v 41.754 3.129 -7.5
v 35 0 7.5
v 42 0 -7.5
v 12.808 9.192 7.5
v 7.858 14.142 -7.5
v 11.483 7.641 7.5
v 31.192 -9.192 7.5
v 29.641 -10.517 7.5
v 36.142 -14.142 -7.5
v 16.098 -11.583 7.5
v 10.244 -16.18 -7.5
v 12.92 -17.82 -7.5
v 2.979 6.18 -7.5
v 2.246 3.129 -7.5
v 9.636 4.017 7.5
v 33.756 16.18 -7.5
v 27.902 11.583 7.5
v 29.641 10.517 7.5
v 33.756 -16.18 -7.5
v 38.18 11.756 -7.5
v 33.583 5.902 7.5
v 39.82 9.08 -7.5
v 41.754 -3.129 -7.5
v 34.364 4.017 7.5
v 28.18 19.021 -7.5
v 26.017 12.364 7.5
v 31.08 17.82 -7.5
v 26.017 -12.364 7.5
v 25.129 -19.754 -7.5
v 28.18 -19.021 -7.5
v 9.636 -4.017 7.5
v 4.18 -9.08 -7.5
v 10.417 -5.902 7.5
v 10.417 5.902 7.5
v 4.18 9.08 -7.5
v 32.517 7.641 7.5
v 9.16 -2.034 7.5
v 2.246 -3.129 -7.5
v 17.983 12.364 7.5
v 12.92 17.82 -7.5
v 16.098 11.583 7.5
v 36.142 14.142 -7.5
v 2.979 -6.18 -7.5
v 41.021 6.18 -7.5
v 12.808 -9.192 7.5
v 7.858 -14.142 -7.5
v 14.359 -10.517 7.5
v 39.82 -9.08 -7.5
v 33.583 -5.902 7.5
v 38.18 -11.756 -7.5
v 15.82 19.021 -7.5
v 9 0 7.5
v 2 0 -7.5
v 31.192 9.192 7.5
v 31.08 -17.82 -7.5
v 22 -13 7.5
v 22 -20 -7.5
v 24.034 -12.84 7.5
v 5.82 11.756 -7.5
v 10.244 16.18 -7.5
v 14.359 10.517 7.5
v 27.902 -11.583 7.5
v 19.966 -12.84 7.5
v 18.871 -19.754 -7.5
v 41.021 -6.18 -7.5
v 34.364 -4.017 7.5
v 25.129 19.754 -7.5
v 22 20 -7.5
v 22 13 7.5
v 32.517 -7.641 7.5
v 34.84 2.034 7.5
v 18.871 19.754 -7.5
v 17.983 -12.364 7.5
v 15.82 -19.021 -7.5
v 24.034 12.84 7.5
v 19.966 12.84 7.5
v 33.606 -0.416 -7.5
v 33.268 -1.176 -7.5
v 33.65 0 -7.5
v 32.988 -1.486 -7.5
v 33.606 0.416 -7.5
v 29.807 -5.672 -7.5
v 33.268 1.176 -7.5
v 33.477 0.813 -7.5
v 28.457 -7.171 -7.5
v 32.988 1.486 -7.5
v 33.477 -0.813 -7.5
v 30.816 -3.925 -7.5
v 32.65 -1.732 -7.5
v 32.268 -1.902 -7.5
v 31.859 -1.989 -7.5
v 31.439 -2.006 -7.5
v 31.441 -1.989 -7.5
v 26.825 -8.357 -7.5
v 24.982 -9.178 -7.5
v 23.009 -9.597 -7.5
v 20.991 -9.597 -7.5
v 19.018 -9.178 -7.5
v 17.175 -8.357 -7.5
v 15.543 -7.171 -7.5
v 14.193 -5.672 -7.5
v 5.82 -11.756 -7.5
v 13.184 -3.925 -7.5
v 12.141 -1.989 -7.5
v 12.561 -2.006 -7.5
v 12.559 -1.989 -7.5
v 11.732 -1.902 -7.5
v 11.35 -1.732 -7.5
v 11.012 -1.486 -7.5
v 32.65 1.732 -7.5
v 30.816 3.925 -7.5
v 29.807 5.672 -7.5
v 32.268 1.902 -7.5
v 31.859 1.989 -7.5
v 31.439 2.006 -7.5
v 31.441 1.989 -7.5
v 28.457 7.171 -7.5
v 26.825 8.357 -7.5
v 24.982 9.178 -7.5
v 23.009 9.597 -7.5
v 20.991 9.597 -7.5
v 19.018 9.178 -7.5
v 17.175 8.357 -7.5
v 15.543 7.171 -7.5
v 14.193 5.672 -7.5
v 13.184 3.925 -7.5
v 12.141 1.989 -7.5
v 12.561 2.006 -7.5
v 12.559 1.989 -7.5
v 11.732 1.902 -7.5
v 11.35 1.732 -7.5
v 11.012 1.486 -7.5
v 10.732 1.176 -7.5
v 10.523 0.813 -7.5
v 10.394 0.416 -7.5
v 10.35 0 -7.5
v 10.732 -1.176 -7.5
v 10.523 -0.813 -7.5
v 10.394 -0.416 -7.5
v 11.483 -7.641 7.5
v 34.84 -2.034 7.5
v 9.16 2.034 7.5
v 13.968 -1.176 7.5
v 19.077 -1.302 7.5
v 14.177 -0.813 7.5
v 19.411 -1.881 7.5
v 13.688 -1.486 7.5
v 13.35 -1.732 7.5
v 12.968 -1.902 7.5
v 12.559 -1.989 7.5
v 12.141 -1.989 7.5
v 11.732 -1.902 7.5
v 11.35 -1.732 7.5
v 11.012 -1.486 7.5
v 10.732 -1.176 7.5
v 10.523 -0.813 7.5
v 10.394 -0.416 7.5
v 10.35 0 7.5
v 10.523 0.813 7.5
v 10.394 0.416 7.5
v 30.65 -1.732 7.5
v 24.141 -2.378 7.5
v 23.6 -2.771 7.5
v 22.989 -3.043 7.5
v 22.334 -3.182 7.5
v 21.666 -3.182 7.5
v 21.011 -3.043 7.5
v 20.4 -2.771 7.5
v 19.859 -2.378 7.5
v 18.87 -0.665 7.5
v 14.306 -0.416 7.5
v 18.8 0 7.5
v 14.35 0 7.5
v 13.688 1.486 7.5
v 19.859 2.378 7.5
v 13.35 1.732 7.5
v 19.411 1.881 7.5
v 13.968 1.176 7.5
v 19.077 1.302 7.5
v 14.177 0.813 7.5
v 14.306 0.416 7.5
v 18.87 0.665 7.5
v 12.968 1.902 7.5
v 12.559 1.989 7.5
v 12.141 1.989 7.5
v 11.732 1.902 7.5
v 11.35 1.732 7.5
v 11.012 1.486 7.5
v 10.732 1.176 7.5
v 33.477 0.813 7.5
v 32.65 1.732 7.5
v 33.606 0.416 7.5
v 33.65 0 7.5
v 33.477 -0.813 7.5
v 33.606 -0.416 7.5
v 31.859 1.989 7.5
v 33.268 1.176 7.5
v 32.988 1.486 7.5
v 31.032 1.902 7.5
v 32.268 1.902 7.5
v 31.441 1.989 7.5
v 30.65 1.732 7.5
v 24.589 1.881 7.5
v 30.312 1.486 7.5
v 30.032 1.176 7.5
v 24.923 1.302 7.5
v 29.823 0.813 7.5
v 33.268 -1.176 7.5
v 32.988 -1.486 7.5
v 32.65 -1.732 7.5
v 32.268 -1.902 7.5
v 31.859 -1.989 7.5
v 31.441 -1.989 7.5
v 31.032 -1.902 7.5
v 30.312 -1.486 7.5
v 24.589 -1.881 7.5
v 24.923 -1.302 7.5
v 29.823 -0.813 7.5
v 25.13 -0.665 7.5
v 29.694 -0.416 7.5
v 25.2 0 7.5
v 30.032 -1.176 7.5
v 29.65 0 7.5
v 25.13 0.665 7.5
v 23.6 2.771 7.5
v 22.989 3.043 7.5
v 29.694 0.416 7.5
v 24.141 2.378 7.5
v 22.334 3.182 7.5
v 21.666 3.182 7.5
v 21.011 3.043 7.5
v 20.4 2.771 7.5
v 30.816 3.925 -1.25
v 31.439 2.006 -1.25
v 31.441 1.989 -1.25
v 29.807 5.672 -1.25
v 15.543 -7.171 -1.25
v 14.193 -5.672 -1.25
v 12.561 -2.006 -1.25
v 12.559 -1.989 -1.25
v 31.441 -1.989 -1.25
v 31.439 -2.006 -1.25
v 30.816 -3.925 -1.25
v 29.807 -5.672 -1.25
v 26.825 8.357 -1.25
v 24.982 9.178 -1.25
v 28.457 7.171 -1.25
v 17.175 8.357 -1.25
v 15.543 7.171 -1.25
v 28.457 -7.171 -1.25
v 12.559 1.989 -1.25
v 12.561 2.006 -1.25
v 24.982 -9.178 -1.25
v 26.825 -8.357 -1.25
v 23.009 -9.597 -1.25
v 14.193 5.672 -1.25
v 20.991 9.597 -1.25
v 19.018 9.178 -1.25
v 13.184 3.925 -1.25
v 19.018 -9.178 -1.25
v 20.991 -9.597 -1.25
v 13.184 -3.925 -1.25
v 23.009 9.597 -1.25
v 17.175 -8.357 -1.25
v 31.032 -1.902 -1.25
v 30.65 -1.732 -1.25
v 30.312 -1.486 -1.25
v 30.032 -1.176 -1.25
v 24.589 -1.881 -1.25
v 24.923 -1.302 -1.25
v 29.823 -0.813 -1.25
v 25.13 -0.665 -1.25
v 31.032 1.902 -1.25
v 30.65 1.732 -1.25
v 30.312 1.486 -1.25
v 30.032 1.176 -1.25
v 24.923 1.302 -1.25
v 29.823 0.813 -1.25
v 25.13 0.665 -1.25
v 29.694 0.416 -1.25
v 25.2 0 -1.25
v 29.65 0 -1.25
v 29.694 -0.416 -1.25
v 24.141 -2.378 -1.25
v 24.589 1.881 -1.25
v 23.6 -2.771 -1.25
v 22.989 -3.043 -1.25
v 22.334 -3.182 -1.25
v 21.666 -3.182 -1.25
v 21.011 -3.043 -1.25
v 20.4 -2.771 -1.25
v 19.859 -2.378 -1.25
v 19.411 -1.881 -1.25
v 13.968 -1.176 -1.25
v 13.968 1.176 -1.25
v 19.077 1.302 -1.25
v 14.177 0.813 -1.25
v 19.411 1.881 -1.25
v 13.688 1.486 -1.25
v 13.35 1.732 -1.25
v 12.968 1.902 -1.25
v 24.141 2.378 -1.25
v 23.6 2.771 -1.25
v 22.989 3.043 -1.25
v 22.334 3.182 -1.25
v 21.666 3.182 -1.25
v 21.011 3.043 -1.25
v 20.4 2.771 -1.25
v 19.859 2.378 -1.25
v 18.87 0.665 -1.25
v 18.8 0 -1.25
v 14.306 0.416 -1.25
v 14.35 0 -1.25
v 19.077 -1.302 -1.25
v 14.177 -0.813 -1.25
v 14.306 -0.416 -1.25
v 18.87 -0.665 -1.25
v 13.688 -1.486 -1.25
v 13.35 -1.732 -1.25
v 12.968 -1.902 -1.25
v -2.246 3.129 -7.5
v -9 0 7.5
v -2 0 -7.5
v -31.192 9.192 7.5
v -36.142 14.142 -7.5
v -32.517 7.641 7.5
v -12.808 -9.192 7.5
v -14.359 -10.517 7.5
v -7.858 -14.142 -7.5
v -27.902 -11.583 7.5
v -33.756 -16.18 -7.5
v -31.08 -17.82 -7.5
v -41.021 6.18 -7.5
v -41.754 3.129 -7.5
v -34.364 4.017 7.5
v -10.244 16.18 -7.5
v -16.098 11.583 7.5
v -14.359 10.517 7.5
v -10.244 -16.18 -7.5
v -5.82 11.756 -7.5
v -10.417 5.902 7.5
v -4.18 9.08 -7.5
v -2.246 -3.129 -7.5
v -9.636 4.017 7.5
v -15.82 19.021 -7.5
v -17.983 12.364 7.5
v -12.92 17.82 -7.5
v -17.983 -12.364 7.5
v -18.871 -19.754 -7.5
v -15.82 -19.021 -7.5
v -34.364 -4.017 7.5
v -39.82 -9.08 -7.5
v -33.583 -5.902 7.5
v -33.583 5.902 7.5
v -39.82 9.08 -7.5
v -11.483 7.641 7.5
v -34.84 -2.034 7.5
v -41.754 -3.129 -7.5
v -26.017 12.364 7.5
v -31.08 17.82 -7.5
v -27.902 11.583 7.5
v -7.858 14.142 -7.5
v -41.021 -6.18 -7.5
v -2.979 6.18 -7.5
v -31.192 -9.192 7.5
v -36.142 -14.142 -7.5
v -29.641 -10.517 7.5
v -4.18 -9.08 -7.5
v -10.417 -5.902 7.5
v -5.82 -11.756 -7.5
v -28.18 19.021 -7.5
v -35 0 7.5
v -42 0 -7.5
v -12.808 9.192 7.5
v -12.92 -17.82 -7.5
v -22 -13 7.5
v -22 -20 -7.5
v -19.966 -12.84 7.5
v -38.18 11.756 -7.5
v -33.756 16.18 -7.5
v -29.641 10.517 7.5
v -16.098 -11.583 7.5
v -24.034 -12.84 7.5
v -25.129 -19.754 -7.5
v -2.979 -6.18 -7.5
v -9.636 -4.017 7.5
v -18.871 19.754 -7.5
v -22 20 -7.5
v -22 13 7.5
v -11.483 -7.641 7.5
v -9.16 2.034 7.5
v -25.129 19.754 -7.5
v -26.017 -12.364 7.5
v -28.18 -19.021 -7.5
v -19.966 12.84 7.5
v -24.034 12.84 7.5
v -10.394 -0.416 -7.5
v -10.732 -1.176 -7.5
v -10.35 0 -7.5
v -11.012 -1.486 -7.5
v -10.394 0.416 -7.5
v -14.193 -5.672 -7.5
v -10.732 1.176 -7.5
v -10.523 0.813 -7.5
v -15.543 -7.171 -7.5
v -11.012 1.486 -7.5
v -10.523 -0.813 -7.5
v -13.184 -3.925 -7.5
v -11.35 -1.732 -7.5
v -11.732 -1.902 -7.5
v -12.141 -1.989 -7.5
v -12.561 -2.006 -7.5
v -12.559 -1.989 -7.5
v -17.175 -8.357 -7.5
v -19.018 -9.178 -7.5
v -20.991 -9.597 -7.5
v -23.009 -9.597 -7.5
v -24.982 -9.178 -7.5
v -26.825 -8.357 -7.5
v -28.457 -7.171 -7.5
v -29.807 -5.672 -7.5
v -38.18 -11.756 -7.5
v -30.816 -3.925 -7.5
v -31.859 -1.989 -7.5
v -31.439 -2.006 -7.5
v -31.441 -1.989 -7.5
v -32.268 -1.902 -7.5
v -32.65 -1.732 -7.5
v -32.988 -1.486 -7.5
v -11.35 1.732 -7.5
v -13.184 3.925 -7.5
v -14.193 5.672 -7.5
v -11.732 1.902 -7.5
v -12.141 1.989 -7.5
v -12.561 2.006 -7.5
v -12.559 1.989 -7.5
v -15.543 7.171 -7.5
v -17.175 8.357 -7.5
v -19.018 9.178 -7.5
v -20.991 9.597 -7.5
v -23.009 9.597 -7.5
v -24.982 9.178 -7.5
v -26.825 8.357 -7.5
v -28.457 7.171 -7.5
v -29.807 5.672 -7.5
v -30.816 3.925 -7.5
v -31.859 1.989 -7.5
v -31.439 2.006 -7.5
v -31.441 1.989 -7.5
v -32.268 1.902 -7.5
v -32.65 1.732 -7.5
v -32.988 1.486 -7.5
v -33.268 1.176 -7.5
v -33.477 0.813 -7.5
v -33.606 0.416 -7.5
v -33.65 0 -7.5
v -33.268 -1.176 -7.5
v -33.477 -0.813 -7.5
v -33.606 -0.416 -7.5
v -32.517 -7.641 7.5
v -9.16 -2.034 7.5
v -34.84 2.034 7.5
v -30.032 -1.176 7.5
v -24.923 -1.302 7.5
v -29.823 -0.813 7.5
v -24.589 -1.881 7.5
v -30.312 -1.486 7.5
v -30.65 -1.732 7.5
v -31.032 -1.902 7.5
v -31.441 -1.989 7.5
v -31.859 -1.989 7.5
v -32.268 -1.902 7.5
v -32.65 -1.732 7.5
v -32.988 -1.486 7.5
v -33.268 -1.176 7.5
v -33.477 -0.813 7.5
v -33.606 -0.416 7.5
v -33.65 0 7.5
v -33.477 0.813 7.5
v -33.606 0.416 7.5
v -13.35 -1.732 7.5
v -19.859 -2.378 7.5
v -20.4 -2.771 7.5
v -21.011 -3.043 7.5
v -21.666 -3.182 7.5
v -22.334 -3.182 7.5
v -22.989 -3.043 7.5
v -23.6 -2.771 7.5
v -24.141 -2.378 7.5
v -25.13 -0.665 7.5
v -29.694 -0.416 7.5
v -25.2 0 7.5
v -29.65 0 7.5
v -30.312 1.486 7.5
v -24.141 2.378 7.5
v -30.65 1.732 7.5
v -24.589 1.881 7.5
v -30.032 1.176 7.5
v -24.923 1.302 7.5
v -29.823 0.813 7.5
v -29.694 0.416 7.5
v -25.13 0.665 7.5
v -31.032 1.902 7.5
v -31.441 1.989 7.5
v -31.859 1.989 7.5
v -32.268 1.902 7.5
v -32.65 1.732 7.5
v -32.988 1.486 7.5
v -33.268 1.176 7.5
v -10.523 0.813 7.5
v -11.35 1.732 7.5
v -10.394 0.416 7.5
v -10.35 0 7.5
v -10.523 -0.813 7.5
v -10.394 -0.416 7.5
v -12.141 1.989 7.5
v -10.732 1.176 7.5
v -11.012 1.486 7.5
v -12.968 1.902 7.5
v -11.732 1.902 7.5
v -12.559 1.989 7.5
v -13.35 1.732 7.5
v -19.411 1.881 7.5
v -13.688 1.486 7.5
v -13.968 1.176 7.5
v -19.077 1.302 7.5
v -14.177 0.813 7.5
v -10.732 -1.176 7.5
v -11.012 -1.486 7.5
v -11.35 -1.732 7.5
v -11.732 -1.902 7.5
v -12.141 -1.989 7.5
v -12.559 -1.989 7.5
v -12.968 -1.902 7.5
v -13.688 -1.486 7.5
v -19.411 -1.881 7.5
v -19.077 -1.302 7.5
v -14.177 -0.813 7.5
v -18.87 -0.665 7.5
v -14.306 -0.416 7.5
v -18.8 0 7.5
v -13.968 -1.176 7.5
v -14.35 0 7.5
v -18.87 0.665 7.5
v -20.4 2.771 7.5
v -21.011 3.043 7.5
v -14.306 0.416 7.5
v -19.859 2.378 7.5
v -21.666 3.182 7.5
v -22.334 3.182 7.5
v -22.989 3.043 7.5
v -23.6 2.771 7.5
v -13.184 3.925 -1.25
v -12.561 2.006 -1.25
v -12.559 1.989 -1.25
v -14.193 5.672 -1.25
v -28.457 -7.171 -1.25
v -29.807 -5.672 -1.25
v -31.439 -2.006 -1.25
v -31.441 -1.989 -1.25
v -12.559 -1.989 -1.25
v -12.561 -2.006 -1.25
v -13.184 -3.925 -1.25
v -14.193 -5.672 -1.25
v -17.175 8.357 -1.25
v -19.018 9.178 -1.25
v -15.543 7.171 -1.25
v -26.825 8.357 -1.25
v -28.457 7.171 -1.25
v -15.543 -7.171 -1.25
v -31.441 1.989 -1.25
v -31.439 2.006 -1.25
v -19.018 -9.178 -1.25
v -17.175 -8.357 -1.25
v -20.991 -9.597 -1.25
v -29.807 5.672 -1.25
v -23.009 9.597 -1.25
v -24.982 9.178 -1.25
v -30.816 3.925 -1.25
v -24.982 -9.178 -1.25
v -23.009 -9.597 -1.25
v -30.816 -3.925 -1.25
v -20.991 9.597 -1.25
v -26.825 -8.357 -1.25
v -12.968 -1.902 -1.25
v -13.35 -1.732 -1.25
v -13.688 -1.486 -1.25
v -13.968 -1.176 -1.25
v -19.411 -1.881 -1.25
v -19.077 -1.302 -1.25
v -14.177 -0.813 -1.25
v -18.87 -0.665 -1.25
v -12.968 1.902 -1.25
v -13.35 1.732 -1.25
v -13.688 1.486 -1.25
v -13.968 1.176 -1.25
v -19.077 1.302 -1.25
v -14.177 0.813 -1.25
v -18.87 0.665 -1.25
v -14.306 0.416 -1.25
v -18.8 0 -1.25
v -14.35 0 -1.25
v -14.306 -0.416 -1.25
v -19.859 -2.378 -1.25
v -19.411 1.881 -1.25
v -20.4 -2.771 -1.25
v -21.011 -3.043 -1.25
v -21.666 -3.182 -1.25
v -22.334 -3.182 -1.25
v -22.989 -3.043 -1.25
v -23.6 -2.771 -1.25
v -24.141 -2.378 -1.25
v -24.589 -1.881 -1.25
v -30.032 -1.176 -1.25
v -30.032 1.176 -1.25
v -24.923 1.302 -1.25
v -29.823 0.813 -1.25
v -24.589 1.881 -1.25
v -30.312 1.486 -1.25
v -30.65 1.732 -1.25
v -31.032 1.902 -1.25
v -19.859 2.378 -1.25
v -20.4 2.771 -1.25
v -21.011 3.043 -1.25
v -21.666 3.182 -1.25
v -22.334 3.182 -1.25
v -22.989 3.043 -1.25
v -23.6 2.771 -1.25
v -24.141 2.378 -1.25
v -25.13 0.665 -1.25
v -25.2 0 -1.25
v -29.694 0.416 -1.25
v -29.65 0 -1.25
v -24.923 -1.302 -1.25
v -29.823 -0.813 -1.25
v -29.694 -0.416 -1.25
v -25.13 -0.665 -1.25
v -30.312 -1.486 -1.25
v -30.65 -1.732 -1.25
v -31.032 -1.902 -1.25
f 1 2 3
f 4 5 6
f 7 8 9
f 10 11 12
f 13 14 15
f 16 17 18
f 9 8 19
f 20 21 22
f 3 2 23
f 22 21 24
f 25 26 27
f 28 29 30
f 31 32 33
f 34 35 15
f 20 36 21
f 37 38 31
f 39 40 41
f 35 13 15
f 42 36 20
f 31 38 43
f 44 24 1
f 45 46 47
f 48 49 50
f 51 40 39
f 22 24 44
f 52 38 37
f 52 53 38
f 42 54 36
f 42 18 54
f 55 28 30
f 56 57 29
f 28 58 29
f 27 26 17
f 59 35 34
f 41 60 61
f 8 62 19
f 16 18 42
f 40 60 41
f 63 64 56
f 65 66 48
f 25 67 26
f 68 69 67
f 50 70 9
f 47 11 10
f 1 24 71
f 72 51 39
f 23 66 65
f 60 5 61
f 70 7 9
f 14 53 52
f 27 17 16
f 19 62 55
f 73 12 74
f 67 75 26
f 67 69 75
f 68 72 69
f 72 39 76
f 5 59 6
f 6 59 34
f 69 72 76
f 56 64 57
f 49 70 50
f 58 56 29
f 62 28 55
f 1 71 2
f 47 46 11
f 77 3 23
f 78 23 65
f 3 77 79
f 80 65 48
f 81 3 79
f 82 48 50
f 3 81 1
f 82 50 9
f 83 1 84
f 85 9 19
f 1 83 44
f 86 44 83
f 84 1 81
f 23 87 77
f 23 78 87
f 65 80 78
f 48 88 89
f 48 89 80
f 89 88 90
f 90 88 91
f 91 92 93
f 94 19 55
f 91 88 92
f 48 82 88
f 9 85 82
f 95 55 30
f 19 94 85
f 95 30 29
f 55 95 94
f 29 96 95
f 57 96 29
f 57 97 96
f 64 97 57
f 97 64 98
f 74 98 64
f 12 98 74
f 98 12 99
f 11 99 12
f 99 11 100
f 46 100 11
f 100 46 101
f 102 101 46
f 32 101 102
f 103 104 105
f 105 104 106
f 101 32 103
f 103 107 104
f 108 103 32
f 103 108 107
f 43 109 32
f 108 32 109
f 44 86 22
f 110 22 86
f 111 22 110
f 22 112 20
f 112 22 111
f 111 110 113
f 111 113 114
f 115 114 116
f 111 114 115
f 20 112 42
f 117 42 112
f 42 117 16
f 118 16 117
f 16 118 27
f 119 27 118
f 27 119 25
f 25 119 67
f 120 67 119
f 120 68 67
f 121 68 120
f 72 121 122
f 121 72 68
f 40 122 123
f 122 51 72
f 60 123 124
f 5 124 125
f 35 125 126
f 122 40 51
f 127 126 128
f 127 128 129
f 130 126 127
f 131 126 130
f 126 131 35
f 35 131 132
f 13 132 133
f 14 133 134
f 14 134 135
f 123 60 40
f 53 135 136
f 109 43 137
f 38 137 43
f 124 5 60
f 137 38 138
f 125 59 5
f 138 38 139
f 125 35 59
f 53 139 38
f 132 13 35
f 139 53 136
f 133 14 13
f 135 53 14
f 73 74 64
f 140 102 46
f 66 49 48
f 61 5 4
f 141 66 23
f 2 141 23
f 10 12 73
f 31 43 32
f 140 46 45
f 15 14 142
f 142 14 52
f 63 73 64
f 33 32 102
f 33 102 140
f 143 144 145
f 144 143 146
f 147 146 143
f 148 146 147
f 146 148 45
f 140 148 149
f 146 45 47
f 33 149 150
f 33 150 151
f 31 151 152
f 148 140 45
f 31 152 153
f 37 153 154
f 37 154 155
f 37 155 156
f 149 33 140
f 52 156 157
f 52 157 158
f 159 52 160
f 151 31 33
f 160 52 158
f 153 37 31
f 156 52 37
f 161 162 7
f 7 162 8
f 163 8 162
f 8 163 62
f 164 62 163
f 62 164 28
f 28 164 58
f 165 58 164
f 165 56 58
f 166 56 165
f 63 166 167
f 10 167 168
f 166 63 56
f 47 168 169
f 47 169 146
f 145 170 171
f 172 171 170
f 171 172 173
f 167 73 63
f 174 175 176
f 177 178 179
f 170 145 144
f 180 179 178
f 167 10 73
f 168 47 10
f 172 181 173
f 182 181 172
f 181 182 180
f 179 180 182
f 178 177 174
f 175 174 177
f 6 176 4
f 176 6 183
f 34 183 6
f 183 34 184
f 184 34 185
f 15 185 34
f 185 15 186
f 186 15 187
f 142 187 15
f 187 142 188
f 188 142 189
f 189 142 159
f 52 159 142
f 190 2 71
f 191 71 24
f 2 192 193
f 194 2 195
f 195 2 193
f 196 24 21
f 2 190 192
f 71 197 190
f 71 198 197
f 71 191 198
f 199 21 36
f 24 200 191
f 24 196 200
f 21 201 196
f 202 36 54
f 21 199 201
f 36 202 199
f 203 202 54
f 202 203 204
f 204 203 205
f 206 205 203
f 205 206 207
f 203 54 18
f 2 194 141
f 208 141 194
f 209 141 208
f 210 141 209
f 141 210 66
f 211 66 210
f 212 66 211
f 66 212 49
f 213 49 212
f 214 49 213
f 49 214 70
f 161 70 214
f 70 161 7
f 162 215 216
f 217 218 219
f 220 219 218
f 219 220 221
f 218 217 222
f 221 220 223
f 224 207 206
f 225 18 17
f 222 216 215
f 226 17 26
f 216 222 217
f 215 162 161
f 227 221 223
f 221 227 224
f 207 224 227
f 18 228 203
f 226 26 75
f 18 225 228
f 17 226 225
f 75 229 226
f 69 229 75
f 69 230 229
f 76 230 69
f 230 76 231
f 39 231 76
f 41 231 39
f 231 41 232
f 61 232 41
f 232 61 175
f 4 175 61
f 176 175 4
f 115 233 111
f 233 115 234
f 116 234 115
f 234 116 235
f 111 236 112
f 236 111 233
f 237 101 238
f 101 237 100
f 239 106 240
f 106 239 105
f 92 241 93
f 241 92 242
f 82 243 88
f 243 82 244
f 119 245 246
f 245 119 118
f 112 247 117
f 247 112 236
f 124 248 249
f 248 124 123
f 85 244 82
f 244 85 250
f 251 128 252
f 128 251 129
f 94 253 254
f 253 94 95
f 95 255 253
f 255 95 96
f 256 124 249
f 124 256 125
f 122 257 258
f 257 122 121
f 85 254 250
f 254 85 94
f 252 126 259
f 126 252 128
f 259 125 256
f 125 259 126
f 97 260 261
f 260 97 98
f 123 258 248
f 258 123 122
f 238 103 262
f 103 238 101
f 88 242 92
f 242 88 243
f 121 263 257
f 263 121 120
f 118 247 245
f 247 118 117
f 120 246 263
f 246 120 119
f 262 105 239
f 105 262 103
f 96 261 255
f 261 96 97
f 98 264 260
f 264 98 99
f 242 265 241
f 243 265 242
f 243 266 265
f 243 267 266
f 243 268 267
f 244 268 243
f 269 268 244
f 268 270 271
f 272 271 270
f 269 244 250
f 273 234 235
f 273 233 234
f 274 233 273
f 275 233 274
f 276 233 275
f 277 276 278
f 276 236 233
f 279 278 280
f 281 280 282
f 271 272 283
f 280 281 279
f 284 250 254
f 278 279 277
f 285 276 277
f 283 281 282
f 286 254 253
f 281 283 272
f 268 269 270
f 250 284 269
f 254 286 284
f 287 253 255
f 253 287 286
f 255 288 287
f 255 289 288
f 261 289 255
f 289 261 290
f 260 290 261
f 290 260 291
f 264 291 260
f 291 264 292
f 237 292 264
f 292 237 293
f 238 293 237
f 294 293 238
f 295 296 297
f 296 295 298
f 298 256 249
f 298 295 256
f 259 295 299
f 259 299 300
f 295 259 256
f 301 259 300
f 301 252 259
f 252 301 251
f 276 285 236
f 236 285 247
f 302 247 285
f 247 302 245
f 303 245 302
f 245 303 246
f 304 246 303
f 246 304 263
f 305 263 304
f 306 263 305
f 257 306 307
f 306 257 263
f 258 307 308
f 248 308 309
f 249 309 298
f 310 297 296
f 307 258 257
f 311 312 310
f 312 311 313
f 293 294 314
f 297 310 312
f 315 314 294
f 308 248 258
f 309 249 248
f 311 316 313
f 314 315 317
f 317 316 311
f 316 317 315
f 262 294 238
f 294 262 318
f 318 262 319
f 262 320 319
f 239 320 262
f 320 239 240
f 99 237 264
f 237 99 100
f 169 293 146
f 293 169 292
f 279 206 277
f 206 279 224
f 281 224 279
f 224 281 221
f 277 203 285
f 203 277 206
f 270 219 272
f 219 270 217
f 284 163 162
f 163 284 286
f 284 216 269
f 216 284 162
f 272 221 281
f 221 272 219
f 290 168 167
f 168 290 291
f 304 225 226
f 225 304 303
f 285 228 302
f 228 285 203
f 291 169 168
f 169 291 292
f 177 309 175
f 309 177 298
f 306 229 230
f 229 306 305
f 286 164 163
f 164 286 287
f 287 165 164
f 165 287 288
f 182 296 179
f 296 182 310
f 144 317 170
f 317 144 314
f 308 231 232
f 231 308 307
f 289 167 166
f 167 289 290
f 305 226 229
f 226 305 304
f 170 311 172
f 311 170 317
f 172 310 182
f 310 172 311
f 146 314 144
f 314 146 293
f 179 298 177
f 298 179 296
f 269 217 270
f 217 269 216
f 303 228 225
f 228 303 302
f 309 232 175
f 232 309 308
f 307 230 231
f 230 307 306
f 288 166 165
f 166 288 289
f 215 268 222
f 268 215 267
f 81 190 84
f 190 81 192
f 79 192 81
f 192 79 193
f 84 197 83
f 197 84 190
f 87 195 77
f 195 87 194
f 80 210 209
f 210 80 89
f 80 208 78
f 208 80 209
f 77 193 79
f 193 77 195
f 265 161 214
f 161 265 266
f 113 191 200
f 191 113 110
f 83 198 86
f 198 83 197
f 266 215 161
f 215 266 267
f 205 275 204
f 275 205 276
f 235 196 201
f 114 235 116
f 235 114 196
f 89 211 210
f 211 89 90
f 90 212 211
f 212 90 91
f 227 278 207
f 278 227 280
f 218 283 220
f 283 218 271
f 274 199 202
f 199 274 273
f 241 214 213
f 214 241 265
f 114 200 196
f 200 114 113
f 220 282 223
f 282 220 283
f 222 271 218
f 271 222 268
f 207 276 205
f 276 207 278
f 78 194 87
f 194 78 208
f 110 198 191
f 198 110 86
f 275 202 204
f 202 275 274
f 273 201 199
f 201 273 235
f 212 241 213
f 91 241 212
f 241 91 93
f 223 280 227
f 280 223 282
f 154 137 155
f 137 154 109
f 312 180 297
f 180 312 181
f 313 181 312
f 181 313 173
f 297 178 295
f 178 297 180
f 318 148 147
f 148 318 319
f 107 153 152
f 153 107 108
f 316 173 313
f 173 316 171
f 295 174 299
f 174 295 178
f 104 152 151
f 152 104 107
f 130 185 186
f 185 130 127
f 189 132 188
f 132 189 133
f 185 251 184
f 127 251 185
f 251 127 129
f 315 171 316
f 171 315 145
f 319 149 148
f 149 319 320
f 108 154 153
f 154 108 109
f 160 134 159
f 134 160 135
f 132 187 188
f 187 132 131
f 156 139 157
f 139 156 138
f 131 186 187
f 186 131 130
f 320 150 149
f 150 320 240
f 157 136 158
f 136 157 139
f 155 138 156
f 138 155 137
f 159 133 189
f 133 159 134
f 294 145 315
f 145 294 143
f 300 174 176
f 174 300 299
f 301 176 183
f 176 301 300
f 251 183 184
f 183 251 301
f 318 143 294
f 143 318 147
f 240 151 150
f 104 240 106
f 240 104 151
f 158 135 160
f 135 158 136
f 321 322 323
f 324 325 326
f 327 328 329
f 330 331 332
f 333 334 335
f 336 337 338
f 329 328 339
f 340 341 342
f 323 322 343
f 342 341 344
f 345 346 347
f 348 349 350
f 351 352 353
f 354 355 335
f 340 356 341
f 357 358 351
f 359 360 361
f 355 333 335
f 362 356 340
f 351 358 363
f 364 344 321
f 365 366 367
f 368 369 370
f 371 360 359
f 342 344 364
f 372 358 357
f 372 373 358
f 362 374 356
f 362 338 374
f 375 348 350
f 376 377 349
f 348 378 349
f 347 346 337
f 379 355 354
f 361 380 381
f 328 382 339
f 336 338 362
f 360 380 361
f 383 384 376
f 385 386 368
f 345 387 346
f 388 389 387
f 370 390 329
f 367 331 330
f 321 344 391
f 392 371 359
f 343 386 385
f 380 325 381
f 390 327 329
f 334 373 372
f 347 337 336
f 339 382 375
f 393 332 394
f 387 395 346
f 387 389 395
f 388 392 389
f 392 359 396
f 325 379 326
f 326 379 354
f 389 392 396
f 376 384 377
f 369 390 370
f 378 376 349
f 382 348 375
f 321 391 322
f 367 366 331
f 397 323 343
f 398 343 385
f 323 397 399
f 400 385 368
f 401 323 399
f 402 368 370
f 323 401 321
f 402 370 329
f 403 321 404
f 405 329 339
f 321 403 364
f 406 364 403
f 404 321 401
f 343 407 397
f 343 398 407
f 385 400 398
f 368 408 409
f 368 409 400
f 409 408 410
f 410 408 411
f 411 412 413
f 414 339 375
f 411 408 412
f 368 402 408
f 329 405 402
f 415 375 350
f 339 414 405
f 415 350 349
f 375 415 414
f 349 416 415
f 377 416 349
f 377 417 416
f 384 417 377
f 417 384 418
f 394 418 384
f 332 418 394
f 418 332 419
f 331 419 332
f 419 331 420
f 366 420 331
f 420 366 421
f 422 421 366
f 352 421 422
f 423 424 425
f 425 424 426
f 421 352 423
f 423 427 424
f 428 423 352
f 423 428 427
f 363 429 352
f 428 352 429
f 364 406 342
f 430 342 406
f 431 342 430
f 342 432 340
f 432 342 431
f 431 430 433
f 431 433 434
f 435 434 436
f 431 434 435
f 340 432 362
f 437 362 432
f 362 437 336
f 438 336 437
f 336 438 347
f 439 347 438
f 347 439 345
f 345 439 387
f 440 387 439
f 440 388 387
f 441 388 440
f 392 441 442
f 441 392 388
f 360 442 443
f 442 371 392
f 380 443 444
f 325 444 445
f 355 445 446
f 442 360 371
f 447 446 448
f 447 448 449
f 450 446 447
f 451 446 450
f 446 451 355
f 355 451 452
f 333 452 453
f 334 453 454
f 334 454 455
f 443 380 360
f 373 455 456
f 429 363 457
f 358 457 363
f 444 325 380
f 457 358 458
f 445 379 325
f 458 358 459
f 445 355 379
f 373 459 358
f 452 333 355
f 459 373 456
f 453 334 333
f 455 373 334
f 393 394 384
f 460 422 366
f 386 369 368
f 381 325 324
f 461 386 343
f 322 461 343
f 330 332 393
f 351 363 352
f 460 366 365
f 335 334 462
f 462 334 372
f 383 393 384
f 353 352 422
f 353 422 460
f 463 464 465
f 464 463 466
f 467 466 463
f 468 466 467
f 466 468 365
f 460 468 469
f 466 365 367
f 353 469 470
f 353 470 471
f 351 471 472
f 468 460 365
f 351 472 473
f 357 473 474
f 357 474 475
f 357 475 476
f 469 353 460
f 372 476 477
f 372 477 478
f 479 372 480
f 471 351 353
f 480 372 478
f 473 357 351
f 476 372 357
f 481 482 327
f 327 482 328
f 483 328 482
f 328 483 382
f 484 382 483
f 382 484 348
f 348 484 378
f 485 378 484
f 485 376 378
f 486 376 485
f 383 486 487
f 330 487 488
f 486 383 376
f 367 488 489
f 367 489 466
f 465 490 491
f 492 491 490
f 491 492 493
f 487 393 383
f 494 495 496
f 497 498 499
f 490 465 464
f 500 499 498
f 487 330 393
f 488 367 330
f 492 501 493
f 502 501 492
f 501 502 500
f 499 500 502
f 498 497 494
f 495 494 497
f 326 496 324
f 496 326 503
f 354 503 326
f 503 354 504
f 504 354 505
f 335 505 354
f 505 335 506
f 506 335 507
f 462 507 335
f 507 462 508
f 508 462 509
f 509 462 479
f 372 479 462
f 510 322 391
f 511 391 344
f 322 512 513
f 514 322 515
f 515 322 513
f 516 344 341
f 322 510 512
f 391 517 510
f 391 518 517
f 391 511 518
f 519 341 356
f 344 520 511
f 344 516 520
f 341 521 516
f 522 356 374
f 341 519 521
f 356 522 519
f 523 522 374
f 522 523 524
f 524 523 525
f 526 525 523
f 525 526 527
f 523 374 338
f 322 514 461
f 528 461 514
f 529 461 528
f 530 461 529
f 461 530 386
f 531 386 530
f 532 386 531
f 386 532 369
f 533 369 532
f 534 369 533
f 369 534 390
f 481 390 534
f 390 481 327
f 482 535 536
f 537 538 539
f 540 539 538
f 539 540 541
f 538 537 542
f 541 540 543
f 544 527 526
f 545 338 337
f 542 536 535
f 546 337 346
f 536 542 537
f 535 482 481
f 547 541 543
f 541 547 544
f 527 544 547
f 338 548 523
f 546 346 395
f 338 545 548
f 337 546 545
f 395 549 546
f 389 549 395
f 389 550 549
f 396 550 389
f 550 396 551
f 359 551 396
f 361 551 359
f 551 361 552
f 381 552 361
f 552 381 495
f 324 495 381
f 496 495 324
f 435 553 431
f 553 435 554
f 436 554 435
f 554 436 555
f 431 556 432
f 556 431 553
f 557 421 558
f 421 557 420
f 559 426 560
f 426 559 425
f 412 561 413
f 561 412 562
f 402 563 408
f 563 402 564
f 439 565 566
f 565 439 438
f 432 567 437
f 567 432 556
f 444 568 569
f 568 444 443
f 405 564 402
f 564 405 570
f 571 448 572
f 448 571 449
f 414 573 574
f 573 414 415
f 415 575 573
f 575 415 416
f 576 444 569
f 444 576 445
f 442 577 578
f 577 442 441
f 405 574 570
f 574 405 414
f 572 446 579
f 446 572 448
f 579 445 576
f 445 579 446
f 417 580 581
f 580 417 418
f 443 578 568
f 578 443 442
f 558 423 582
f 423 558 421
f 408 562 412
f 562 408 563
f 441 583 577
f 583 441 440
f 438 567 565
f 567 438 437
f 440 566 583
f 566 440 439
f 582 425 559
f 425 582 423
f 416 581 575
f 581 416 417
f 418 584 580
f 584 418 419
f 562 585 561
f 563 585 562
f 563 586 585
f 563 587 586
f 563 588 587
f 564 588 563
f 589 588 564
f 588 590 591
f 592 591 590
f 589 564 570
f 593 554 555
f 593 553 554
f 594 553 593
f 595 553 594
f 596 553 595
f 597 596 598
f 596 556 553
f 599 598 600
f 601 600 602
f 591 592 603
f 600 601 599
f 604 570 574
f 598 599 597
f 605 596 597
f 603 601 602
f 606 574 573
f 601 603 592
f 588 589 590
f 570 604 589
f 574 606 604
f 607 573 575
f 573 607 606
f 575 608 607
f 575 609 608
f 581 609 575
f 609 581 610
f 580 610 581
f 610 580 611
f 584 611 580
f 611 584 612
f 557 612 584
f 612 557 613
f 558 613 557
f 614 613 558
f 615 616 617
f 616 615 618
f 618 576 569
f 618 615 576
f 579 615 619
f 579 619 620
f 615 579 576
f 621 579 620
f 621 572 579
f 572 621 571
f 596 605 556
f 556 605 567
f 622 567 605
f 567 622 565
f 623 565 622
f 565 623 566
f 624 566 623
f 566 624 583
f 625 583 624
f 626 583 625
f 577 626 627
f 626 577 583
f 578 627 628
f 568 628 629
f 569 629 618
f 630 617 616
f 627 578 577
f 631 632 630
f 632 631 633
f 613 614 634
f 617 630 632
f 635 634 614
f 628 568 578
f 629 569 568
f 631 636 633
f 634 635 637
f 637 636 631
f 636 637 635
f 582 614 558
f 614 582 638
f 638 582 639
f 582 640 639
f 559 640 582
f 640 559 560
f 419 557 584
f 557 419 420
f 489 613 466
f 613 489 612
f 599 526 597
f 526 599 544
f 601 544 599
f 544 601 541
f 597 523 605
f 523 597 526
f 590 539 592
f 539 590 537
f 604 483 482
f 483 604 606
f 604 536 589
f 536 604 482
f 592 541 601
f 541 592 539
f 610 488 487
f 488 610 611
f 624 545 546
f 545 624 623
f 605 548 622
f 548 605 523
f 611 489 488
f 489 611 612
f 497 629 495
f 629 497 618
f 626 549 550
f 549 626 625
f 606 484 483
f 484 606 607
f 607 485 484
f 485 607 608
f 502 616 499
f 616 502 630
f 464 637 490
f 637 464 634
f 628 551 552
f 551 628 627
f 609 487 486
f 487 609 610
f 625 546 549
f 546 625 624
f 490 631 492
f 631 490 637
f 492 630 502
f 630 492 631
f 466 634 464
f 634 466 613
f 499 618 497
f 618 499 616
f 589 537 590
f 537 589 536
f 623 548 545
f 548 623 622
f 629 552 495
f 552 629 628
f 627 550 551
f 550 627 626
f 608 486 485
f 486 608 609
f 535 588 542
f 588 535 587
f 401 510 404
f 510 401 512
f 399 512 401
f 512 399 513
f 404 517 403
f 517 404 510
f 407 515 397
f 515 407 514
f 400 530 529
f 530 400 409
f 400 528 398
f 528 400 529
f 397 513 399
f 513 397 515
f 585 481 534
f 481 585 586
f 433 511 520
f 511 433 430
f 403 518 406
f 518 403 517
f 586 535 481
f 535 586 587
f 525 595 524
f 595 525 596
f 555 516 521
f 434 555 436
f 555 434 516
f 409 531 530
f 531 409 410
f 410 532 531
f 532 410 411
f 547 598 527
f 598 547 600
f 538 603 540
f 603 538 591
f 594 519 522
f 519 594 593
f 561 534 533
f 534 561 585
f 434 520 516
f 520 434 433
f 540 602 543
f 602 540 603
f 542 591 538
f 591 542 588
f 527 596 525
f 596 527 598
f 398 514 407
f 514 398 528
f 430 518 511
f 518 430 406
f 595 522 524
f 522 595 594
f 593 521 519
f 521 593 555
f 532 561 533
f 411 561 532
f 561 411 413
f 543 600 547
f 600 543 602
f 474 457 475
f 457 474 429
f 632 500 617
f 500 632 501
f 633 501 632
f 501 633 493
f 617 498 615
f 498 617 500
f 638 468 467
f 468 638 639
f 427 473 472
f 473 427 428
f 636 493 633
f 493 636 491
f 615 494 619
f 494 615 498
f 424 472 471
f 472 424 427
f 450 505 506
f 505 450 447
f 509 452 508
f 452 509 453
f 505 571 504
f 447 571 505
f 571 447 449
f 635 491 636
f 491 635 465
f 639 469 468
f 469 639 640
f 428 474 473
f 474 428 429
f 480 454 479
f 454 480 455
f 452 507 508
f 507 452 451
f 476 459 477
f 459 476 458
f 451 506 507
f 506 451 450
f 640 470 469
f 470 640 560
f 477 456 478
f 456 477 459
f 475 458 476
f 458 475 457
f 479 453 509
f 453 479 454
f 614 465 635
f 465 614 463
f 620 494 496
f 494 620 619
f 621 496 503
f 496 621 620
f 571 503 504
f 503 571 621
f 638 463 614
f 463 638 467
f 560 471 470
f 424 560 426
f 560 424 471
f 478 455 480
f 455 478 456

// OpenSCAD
/**
 * Spool cone
 *
 */

rmax = 20;
rmin = 13;
height = 15;
rod = 6.4;
bearH = 5.2;
bearOD = 19.3;
holeR = 2;

module cone()
{
difference () {
cylinder(h = height, r1 = rmax, r2 = rmin, center = true, $fn=40);

//bearing cilinder
translate([0, 0, -height/2+(bearH+1)/2]){ cylinder(h=bearH+1.1, r = bearOD/2, center =true, $fn=30); }

//rod cilinder
cylinder(h=height*2, r = rod/2, center = true, $fn=30);

//push holes
translate([bearOD/2, 0, 0]){ cylinder(h=height*2, r = holeR, center =true, $fn=30); }
translate([-bearOD/2, 0, 0]){ cylinder(h=height*2, r = holeR, center =true, $fn=30); }
///translate([0, bearOD/2, 0]){ cylinder(h=height*2, r = holeR, center =true, $fn=30); }
///translate([0, -bearOD/2, 0]){ cylinder(h=height*2, r = holeR, center =true, $fn=30); }
}

}//module

translate([rmax+2,0,0]){ cone(); }
translate([-rmax-2,0,0]){ cone(); }
